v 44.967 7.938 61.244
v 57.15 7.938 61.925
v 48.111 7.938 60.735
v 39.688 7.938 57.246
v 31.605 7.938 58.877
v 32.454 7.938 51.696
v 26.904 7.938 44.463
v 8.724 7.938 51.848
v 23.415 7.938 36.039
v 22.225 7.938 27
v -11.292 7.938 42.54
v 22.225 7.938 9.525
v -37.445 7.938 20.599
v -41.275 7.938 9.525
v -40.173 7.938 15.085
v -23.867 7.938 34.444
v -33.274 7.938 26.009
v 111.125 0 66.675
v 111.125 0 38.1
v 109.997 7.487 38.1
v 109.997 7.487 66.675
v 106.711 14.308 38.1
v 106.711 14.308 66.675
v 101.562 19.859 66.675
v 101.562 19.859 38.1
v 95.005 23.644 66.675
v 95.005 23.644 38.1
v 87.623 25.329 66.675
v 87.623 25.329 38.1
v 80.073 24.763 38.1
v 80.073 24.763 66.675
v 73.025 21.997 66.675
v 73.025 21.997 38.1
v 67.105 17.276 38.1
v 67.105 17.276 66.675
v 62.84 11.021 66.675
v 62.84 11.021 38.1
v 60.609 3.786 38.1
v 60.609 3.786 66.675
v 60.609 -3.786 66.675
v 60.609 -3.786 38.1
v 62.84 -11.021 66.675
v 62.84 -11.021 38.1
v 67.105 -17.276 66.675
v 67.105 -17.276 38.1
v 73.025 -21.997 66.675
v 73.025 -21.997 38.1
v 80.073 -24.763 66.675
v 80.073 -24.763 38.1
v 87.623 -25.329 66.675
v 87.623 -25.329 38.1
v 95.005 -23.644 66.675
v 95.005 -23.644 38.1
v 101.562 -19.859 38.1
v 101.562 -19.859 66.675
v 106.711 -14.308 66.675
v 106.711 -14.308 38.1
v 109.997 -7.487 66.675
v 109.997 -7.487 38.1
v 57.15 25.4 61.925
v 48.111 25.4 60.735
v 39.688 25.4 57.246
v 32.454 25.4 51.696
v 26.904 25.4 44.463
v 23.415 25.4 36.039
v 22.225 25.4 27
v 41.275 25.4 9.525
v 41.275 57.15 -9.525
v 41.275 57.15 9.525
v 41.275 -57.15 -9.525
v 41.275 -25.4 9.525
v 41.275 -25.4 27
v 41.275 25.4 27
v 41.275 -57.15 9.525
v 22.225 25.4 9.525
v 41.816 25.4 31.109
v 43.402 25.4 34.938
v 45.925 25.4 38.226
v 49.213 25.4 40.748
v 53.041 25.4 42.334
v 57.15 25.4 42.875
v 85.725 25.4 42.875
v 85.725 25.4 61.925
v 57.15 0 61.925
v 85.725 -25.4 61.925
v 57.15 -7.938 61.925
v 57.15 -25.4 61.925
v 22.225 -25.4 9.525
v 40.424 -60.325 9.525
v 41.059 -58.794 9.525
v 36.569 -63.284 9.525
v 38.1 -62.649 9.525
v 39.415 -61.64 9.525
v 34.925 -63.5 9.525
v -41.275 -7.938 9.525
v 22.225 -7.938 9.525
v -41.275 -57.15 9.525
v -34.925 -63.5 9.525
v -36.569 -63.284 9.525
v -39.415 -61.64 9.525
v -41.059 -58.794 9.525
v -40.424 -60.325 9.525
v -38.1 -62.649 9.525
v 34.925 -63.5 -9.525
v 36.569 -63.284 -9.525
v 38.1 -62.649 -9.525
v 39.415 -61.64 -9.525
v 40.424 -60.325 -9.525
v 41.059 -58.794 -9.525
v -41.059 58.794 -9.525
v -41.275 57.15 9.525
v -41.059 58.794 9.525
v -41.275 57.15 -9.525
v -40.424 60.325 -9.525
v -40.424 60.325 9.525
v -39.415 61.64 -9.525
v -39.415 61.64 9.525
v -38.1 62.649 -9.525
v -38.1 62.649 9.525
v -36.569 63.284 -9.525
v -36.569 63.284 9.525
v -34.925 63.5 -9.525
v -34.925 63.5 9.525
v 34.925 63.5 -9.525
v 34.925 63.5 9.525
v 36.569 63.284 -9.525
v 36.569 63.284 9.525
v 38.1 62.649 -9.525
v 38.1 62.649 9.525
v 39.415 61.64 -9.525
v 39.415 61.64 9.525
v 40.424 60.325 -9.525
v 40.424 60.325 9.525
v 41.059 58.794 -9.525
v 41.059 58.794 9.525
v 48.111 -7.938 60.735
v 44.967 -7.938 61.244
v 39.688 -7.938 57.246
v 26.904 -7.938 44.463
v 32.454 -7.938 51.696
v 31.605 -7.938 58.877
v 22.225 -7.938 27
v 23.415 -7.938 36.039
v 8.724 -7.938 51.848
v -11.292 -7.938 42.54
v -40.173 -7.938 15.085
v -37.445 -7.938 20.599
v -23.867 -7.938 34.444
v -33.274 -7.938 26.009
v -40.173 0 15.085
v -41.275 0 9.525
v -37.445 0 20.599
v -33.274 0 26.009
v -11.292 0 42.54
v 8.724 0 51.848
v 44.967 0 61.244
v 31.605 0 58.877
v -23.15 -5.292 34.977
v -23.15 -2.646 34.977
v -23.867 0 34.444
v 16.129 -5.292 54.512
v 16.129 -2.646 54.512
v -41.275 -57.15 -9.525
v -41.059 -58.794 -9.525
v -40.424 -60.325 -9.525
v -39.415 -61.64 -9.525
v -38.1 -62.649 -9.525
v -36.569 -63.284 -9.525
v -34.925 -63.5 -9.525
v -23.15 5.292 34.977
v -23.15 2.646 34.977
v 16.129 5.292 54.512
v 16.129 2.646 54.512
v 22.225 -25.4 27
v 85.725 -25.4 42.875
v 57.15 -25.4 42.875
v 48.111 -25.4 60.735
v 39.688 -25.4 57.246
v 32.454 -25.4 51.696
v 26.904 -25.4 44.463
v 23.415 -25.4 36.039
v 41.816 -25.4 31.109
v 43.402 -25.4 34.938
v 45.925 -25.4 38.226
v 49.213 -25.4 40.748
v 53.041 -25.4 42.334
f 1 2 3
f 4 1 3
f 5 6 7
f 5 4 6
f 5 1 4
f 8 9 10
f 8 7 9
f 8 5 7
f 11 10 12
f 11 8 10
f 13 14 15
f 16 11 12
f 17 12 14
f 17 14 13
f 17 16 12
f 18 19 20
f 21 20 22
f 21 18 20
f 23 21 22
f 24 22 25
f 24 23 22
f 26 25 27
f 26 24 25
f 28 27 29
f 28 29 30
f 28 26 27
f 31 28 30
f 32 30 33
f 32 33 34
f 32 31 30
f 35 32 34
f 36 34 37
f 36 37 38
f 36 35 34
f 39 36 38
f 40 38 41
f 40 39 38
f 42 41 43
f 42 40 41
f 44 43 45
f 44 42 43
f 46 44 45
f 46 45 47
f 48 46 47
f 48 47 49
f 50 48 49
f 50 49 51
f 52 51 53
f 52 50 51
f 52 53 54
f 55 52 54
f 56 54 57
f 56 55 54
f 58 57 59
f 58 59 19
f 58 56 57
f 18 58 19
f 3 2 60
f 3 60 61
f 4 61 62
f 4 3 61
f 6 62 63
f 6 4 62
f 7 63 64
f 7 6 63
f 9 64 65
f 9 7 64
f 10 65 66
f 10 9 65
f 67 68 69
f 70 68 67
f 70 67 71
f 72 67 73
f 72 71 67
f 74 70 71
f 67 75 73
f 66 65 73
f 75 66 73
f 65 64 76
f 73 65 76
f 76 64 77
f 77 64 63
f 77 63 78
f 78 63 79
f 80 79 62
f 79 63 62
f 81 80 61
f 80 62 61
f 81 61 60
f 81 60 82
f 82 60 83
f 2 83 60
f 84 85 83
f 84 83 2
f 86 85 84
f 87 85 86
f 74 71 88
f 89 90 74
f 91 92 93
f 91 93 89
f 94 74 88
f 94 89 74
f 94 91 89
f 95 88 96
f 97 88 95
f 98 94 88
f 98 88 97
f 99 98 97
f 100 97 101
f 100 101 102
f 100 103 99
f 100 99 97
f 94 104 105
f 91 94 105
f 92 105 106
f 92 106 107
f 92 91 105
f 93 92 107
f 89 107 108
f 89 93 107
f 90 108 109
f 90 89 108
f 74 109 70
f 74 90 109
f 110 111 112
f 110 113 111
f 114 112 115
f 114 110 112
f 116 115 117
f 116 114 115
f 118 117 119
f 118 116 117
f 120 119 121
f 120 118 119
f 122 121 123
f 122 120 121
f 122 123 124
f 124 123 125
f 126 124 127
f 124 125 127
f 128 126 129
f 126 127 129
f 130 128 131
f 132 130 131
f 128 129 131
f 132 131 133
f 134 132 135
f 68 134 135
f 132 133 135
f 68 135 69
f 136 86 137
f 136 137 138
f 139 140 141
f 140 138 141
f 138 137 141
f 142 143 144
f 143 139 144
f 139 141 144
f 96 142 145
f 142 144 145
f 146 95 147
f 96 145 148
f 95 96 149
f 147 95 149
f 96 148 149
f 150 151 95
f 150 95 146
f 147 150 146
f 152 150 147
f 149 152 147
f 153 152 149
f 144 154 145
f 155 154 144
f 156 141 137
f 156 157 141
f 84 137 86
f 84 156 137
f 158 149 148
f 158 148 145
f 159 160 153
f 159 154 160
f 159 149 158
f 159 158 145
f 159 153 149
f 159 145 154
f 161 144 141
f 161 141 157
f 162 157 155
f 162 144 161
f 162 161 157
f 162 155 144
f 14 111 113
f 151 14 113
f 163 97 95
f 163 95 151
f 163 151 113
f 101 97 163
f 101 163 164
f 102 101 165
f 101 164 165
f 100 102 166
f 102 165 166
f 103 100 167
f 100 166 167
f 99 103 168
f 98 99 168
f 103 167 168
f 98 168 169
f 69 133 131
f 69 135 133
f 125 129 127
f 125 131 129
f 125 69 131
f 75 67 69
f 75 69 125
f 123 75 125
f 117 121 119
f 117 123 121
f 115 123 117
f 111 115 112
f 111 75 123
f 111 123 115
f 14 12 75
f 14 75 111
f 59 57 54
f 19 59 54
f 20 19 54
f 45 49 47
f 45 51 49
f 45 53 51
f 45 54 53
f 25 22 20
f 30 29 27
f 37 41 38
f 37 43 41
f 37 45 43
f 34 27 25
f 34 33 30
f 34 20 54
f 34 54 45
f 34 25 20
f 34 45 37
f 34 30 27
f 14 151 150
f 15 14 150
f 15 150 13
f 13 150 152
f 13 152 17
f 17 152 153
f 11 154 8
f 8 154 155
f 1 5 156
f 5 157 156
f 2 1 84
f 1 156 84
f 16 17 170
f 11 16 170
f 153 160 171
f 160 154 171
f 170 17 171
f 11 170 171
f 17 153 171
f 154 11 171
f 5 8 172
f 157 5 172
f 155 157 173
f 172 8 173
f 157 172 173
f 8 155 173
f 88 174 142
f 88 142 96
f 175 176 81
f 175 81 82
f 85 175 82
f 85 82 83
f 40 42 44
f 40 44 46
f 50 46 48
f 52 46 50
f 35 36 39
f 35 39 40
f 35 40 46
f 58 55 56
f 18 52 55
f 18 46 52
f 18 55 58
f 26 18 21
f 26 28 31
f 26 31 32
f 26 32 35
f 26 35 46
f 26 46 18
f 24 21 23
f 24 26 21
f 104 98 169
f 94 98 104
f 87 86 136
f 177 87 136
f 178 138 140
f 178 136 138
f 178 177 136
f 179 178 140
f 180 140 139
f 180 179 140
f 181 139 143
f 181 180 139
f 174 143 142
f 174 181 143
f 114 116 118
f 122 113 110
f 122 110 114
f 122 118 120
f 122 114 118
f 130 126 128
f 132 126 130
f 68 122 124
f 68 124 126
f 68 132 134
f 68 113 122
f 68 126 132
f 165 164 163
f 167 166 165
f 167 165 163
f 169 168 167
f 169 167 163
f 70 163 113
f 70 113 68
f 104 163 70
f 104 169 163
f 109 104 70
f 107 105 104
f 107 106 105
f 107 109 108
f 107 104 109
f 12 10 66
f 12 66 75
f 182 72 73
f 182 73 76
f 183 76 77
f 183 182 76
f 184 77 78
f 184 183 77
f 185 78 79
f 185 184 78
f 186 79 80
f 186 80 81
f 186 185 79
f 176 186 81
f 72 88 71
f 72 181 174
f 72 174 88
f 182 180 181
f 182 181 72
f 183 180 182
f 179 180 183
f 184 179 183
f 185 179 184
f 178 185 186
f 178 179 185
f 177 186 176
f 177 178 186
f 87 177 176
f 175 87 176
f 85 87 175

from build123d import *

# Parameters (mm, degrees)
F1_DEPTH = 63.5
F0_W     = 25.4
F0_H     = 19.05
F2_DEPTH = 25.4
F3_DEPTH = 7.9375
F4_R     = 6.35


with BuildPart() as f1:
    # F0 (on Front) → F1 (new body, symmetric)
    with BuildSketch(Plane.XZ):
        Polygon((-41.275, 9.525), (-41.275, -9.525), (41.275, -9.525), (41.275, 9.525), (22.225, 9.525), align=None)
    extrude(amount=F1_DEPTH, both=True)

    # F0 (on Front) → F2 (join, symmetric)
    with BuildSketch(Plane.XZ):
        with BuildLine():
            Line((22.225, 9.525), (41.275, 9.525))
            Line((41.275, 9.525), (41.275, 27.0002))
            ThreePointArc((41.275, 27.0002), (45.92468, 38.22552), (57.15, 42.8752))
            Line((57.15, 42.8752), (60.325, 42.8752))
            Line((60.325, 42.8752), (60.325, 61.9252))
            Line((60.325, 61.9252), (57.15, 61.9252))
            ThreePointArc((57.15, 61.9252), (32.454296, 51.695904), (22.225, 27.0002))
            Line((22.225, 27.0002), (22.225, 9.525))
        make_face()
        with Locations((73.025, 52.4002)):
            Rectangle(F0_W, F0_H)
    extrude(amount=F2_DEPTH, both=True)

    # F0 (on Front) → F3 (join, symmetric)
    with BuildSketch(Plane.XZ):
        with BuildLine():
            add(Edge.make_bspline(
                [(-41.275, 9.525), (-40.197041, 35.868797), (21.728976, 62.639967), (57.15, 61.9252)],
                knots=[0, 0, 0, 0, 111.504536, 111.504536, 111.504536, 111.504536], degree=3))
            Line((-41.275, 9.525), (22.225, 9.525))
            Line((22.225, 9.525), (22.225, 27.0002))
            ThreePointArc((22.225, 27.0002), (32.454296, 51.695904), (57.15, 61.9252))
        make_face()
    extrude(amount=F3_DEPTH, both=True)

    # F4
    f4_edges = [f1.edges().sort_by_distance(p)[0] for p in [
        (-41.275, -63.5, 0),
        (41.275, -63.5, 0),
        (41.275, 63.5, 0),
        (-41.275, 63.5, 0),
    ]]
    fillet(f4_edges, radius=F4_R)


with BuildPart() as f5:
    # F0 (on Front) → F5 (revolve)
    with BuildSketch(Plane.XZ):
        Polygon((85.725, 66.675), (85.725, 61.9252), (85.725, 42.8752), (85.725, 38.1), (111.125, 38.1), (111.125, 66.675), align=None)
    revolve(axis=Axis((85.725, 0, 52.3875), (0, 0, 1)))


solid = Compound([f1.part, f5.part])
